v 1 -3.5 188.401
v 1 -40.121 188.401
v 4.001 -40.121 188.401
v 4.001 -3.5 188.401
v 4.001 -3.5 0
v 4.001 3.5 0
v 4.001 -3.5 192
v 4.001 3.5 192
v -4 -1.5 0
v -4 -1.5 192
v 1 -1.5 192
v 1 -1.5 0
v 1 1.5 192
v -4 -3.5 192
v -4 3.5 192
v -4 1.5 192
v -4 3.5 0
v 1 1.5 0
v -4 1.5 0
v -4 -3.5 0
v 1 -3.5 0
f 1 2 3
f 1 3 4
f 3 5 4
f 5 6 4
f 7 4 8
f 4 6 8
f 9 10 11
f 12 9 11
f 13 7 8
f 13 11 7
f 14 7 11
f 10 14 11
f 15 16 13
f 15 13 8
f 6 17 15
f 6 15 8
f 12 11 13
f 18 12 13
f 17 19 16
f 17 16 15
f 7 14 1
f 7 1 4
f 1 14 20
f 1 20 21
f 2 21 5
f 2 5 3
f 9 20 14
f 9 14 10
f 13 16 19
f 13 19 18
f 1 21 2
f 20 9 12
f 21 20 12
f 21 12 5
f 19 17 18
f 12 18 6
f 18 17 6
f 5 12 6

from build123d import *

# Parameters (mm, degrees)
SKETCH1_W                = 8
SKETCH1_H                = 7
BOSS_EXTRUDE1_DEPTH      = 192
SKETCH2_W                = 5
SKETCH2_H                = 3
CUT_EXTRUDE1_DEPTH       = 192
BOSS_EXTRUDE2_DEPTH      = 0.001
BOSS_EXTRUDE2_DEPTH_BACK = 3


with BuildPart() as part:
    # Sketch1 → Boss-Extrude1 (new body)
    with BuildSketch(Plane.XY):
        Rectangle(SKETCH1_W, SKETCH1_H)
    extrude(amount=BOSS_EXTRUDE1_DEPTH)

    # Sketch2 → Cut-Extrude1 (cut)
    with BuildSketch(Plane.XY.offset(192)):
        with Locations((-1.5, 0)):
            Rectangle(SKETCH2_W, SKETCH2_H)
    extrude(amount=-CUT_EXTRUDE1_DEPTH, mode=Mode.SUBTRACT)

    # Sketch3 → Boss-Extrude2 (add, two sides: drawn at the far end of the back side and taken through both)
    with BuildSketch(Plane(origin=(4, 0, 0), x_dir=(0, 0, -1), z_dir=(1, 0, 0)).offset(-BOSS_EXTRUDE2_DEPTH_BACK)):
        Polygon((0, -3.5), (-188.401251416, -40.121493492), (-188.401251416, -3.5), (-192, -3.5), (-192, 3.5), (0, 3.5), align=None)
    extrude(amount=BOSS_EXTRUDE2_DEPTH + BOSS_EXTRUDE2_DEPTH_BACK)


solid = part.part
